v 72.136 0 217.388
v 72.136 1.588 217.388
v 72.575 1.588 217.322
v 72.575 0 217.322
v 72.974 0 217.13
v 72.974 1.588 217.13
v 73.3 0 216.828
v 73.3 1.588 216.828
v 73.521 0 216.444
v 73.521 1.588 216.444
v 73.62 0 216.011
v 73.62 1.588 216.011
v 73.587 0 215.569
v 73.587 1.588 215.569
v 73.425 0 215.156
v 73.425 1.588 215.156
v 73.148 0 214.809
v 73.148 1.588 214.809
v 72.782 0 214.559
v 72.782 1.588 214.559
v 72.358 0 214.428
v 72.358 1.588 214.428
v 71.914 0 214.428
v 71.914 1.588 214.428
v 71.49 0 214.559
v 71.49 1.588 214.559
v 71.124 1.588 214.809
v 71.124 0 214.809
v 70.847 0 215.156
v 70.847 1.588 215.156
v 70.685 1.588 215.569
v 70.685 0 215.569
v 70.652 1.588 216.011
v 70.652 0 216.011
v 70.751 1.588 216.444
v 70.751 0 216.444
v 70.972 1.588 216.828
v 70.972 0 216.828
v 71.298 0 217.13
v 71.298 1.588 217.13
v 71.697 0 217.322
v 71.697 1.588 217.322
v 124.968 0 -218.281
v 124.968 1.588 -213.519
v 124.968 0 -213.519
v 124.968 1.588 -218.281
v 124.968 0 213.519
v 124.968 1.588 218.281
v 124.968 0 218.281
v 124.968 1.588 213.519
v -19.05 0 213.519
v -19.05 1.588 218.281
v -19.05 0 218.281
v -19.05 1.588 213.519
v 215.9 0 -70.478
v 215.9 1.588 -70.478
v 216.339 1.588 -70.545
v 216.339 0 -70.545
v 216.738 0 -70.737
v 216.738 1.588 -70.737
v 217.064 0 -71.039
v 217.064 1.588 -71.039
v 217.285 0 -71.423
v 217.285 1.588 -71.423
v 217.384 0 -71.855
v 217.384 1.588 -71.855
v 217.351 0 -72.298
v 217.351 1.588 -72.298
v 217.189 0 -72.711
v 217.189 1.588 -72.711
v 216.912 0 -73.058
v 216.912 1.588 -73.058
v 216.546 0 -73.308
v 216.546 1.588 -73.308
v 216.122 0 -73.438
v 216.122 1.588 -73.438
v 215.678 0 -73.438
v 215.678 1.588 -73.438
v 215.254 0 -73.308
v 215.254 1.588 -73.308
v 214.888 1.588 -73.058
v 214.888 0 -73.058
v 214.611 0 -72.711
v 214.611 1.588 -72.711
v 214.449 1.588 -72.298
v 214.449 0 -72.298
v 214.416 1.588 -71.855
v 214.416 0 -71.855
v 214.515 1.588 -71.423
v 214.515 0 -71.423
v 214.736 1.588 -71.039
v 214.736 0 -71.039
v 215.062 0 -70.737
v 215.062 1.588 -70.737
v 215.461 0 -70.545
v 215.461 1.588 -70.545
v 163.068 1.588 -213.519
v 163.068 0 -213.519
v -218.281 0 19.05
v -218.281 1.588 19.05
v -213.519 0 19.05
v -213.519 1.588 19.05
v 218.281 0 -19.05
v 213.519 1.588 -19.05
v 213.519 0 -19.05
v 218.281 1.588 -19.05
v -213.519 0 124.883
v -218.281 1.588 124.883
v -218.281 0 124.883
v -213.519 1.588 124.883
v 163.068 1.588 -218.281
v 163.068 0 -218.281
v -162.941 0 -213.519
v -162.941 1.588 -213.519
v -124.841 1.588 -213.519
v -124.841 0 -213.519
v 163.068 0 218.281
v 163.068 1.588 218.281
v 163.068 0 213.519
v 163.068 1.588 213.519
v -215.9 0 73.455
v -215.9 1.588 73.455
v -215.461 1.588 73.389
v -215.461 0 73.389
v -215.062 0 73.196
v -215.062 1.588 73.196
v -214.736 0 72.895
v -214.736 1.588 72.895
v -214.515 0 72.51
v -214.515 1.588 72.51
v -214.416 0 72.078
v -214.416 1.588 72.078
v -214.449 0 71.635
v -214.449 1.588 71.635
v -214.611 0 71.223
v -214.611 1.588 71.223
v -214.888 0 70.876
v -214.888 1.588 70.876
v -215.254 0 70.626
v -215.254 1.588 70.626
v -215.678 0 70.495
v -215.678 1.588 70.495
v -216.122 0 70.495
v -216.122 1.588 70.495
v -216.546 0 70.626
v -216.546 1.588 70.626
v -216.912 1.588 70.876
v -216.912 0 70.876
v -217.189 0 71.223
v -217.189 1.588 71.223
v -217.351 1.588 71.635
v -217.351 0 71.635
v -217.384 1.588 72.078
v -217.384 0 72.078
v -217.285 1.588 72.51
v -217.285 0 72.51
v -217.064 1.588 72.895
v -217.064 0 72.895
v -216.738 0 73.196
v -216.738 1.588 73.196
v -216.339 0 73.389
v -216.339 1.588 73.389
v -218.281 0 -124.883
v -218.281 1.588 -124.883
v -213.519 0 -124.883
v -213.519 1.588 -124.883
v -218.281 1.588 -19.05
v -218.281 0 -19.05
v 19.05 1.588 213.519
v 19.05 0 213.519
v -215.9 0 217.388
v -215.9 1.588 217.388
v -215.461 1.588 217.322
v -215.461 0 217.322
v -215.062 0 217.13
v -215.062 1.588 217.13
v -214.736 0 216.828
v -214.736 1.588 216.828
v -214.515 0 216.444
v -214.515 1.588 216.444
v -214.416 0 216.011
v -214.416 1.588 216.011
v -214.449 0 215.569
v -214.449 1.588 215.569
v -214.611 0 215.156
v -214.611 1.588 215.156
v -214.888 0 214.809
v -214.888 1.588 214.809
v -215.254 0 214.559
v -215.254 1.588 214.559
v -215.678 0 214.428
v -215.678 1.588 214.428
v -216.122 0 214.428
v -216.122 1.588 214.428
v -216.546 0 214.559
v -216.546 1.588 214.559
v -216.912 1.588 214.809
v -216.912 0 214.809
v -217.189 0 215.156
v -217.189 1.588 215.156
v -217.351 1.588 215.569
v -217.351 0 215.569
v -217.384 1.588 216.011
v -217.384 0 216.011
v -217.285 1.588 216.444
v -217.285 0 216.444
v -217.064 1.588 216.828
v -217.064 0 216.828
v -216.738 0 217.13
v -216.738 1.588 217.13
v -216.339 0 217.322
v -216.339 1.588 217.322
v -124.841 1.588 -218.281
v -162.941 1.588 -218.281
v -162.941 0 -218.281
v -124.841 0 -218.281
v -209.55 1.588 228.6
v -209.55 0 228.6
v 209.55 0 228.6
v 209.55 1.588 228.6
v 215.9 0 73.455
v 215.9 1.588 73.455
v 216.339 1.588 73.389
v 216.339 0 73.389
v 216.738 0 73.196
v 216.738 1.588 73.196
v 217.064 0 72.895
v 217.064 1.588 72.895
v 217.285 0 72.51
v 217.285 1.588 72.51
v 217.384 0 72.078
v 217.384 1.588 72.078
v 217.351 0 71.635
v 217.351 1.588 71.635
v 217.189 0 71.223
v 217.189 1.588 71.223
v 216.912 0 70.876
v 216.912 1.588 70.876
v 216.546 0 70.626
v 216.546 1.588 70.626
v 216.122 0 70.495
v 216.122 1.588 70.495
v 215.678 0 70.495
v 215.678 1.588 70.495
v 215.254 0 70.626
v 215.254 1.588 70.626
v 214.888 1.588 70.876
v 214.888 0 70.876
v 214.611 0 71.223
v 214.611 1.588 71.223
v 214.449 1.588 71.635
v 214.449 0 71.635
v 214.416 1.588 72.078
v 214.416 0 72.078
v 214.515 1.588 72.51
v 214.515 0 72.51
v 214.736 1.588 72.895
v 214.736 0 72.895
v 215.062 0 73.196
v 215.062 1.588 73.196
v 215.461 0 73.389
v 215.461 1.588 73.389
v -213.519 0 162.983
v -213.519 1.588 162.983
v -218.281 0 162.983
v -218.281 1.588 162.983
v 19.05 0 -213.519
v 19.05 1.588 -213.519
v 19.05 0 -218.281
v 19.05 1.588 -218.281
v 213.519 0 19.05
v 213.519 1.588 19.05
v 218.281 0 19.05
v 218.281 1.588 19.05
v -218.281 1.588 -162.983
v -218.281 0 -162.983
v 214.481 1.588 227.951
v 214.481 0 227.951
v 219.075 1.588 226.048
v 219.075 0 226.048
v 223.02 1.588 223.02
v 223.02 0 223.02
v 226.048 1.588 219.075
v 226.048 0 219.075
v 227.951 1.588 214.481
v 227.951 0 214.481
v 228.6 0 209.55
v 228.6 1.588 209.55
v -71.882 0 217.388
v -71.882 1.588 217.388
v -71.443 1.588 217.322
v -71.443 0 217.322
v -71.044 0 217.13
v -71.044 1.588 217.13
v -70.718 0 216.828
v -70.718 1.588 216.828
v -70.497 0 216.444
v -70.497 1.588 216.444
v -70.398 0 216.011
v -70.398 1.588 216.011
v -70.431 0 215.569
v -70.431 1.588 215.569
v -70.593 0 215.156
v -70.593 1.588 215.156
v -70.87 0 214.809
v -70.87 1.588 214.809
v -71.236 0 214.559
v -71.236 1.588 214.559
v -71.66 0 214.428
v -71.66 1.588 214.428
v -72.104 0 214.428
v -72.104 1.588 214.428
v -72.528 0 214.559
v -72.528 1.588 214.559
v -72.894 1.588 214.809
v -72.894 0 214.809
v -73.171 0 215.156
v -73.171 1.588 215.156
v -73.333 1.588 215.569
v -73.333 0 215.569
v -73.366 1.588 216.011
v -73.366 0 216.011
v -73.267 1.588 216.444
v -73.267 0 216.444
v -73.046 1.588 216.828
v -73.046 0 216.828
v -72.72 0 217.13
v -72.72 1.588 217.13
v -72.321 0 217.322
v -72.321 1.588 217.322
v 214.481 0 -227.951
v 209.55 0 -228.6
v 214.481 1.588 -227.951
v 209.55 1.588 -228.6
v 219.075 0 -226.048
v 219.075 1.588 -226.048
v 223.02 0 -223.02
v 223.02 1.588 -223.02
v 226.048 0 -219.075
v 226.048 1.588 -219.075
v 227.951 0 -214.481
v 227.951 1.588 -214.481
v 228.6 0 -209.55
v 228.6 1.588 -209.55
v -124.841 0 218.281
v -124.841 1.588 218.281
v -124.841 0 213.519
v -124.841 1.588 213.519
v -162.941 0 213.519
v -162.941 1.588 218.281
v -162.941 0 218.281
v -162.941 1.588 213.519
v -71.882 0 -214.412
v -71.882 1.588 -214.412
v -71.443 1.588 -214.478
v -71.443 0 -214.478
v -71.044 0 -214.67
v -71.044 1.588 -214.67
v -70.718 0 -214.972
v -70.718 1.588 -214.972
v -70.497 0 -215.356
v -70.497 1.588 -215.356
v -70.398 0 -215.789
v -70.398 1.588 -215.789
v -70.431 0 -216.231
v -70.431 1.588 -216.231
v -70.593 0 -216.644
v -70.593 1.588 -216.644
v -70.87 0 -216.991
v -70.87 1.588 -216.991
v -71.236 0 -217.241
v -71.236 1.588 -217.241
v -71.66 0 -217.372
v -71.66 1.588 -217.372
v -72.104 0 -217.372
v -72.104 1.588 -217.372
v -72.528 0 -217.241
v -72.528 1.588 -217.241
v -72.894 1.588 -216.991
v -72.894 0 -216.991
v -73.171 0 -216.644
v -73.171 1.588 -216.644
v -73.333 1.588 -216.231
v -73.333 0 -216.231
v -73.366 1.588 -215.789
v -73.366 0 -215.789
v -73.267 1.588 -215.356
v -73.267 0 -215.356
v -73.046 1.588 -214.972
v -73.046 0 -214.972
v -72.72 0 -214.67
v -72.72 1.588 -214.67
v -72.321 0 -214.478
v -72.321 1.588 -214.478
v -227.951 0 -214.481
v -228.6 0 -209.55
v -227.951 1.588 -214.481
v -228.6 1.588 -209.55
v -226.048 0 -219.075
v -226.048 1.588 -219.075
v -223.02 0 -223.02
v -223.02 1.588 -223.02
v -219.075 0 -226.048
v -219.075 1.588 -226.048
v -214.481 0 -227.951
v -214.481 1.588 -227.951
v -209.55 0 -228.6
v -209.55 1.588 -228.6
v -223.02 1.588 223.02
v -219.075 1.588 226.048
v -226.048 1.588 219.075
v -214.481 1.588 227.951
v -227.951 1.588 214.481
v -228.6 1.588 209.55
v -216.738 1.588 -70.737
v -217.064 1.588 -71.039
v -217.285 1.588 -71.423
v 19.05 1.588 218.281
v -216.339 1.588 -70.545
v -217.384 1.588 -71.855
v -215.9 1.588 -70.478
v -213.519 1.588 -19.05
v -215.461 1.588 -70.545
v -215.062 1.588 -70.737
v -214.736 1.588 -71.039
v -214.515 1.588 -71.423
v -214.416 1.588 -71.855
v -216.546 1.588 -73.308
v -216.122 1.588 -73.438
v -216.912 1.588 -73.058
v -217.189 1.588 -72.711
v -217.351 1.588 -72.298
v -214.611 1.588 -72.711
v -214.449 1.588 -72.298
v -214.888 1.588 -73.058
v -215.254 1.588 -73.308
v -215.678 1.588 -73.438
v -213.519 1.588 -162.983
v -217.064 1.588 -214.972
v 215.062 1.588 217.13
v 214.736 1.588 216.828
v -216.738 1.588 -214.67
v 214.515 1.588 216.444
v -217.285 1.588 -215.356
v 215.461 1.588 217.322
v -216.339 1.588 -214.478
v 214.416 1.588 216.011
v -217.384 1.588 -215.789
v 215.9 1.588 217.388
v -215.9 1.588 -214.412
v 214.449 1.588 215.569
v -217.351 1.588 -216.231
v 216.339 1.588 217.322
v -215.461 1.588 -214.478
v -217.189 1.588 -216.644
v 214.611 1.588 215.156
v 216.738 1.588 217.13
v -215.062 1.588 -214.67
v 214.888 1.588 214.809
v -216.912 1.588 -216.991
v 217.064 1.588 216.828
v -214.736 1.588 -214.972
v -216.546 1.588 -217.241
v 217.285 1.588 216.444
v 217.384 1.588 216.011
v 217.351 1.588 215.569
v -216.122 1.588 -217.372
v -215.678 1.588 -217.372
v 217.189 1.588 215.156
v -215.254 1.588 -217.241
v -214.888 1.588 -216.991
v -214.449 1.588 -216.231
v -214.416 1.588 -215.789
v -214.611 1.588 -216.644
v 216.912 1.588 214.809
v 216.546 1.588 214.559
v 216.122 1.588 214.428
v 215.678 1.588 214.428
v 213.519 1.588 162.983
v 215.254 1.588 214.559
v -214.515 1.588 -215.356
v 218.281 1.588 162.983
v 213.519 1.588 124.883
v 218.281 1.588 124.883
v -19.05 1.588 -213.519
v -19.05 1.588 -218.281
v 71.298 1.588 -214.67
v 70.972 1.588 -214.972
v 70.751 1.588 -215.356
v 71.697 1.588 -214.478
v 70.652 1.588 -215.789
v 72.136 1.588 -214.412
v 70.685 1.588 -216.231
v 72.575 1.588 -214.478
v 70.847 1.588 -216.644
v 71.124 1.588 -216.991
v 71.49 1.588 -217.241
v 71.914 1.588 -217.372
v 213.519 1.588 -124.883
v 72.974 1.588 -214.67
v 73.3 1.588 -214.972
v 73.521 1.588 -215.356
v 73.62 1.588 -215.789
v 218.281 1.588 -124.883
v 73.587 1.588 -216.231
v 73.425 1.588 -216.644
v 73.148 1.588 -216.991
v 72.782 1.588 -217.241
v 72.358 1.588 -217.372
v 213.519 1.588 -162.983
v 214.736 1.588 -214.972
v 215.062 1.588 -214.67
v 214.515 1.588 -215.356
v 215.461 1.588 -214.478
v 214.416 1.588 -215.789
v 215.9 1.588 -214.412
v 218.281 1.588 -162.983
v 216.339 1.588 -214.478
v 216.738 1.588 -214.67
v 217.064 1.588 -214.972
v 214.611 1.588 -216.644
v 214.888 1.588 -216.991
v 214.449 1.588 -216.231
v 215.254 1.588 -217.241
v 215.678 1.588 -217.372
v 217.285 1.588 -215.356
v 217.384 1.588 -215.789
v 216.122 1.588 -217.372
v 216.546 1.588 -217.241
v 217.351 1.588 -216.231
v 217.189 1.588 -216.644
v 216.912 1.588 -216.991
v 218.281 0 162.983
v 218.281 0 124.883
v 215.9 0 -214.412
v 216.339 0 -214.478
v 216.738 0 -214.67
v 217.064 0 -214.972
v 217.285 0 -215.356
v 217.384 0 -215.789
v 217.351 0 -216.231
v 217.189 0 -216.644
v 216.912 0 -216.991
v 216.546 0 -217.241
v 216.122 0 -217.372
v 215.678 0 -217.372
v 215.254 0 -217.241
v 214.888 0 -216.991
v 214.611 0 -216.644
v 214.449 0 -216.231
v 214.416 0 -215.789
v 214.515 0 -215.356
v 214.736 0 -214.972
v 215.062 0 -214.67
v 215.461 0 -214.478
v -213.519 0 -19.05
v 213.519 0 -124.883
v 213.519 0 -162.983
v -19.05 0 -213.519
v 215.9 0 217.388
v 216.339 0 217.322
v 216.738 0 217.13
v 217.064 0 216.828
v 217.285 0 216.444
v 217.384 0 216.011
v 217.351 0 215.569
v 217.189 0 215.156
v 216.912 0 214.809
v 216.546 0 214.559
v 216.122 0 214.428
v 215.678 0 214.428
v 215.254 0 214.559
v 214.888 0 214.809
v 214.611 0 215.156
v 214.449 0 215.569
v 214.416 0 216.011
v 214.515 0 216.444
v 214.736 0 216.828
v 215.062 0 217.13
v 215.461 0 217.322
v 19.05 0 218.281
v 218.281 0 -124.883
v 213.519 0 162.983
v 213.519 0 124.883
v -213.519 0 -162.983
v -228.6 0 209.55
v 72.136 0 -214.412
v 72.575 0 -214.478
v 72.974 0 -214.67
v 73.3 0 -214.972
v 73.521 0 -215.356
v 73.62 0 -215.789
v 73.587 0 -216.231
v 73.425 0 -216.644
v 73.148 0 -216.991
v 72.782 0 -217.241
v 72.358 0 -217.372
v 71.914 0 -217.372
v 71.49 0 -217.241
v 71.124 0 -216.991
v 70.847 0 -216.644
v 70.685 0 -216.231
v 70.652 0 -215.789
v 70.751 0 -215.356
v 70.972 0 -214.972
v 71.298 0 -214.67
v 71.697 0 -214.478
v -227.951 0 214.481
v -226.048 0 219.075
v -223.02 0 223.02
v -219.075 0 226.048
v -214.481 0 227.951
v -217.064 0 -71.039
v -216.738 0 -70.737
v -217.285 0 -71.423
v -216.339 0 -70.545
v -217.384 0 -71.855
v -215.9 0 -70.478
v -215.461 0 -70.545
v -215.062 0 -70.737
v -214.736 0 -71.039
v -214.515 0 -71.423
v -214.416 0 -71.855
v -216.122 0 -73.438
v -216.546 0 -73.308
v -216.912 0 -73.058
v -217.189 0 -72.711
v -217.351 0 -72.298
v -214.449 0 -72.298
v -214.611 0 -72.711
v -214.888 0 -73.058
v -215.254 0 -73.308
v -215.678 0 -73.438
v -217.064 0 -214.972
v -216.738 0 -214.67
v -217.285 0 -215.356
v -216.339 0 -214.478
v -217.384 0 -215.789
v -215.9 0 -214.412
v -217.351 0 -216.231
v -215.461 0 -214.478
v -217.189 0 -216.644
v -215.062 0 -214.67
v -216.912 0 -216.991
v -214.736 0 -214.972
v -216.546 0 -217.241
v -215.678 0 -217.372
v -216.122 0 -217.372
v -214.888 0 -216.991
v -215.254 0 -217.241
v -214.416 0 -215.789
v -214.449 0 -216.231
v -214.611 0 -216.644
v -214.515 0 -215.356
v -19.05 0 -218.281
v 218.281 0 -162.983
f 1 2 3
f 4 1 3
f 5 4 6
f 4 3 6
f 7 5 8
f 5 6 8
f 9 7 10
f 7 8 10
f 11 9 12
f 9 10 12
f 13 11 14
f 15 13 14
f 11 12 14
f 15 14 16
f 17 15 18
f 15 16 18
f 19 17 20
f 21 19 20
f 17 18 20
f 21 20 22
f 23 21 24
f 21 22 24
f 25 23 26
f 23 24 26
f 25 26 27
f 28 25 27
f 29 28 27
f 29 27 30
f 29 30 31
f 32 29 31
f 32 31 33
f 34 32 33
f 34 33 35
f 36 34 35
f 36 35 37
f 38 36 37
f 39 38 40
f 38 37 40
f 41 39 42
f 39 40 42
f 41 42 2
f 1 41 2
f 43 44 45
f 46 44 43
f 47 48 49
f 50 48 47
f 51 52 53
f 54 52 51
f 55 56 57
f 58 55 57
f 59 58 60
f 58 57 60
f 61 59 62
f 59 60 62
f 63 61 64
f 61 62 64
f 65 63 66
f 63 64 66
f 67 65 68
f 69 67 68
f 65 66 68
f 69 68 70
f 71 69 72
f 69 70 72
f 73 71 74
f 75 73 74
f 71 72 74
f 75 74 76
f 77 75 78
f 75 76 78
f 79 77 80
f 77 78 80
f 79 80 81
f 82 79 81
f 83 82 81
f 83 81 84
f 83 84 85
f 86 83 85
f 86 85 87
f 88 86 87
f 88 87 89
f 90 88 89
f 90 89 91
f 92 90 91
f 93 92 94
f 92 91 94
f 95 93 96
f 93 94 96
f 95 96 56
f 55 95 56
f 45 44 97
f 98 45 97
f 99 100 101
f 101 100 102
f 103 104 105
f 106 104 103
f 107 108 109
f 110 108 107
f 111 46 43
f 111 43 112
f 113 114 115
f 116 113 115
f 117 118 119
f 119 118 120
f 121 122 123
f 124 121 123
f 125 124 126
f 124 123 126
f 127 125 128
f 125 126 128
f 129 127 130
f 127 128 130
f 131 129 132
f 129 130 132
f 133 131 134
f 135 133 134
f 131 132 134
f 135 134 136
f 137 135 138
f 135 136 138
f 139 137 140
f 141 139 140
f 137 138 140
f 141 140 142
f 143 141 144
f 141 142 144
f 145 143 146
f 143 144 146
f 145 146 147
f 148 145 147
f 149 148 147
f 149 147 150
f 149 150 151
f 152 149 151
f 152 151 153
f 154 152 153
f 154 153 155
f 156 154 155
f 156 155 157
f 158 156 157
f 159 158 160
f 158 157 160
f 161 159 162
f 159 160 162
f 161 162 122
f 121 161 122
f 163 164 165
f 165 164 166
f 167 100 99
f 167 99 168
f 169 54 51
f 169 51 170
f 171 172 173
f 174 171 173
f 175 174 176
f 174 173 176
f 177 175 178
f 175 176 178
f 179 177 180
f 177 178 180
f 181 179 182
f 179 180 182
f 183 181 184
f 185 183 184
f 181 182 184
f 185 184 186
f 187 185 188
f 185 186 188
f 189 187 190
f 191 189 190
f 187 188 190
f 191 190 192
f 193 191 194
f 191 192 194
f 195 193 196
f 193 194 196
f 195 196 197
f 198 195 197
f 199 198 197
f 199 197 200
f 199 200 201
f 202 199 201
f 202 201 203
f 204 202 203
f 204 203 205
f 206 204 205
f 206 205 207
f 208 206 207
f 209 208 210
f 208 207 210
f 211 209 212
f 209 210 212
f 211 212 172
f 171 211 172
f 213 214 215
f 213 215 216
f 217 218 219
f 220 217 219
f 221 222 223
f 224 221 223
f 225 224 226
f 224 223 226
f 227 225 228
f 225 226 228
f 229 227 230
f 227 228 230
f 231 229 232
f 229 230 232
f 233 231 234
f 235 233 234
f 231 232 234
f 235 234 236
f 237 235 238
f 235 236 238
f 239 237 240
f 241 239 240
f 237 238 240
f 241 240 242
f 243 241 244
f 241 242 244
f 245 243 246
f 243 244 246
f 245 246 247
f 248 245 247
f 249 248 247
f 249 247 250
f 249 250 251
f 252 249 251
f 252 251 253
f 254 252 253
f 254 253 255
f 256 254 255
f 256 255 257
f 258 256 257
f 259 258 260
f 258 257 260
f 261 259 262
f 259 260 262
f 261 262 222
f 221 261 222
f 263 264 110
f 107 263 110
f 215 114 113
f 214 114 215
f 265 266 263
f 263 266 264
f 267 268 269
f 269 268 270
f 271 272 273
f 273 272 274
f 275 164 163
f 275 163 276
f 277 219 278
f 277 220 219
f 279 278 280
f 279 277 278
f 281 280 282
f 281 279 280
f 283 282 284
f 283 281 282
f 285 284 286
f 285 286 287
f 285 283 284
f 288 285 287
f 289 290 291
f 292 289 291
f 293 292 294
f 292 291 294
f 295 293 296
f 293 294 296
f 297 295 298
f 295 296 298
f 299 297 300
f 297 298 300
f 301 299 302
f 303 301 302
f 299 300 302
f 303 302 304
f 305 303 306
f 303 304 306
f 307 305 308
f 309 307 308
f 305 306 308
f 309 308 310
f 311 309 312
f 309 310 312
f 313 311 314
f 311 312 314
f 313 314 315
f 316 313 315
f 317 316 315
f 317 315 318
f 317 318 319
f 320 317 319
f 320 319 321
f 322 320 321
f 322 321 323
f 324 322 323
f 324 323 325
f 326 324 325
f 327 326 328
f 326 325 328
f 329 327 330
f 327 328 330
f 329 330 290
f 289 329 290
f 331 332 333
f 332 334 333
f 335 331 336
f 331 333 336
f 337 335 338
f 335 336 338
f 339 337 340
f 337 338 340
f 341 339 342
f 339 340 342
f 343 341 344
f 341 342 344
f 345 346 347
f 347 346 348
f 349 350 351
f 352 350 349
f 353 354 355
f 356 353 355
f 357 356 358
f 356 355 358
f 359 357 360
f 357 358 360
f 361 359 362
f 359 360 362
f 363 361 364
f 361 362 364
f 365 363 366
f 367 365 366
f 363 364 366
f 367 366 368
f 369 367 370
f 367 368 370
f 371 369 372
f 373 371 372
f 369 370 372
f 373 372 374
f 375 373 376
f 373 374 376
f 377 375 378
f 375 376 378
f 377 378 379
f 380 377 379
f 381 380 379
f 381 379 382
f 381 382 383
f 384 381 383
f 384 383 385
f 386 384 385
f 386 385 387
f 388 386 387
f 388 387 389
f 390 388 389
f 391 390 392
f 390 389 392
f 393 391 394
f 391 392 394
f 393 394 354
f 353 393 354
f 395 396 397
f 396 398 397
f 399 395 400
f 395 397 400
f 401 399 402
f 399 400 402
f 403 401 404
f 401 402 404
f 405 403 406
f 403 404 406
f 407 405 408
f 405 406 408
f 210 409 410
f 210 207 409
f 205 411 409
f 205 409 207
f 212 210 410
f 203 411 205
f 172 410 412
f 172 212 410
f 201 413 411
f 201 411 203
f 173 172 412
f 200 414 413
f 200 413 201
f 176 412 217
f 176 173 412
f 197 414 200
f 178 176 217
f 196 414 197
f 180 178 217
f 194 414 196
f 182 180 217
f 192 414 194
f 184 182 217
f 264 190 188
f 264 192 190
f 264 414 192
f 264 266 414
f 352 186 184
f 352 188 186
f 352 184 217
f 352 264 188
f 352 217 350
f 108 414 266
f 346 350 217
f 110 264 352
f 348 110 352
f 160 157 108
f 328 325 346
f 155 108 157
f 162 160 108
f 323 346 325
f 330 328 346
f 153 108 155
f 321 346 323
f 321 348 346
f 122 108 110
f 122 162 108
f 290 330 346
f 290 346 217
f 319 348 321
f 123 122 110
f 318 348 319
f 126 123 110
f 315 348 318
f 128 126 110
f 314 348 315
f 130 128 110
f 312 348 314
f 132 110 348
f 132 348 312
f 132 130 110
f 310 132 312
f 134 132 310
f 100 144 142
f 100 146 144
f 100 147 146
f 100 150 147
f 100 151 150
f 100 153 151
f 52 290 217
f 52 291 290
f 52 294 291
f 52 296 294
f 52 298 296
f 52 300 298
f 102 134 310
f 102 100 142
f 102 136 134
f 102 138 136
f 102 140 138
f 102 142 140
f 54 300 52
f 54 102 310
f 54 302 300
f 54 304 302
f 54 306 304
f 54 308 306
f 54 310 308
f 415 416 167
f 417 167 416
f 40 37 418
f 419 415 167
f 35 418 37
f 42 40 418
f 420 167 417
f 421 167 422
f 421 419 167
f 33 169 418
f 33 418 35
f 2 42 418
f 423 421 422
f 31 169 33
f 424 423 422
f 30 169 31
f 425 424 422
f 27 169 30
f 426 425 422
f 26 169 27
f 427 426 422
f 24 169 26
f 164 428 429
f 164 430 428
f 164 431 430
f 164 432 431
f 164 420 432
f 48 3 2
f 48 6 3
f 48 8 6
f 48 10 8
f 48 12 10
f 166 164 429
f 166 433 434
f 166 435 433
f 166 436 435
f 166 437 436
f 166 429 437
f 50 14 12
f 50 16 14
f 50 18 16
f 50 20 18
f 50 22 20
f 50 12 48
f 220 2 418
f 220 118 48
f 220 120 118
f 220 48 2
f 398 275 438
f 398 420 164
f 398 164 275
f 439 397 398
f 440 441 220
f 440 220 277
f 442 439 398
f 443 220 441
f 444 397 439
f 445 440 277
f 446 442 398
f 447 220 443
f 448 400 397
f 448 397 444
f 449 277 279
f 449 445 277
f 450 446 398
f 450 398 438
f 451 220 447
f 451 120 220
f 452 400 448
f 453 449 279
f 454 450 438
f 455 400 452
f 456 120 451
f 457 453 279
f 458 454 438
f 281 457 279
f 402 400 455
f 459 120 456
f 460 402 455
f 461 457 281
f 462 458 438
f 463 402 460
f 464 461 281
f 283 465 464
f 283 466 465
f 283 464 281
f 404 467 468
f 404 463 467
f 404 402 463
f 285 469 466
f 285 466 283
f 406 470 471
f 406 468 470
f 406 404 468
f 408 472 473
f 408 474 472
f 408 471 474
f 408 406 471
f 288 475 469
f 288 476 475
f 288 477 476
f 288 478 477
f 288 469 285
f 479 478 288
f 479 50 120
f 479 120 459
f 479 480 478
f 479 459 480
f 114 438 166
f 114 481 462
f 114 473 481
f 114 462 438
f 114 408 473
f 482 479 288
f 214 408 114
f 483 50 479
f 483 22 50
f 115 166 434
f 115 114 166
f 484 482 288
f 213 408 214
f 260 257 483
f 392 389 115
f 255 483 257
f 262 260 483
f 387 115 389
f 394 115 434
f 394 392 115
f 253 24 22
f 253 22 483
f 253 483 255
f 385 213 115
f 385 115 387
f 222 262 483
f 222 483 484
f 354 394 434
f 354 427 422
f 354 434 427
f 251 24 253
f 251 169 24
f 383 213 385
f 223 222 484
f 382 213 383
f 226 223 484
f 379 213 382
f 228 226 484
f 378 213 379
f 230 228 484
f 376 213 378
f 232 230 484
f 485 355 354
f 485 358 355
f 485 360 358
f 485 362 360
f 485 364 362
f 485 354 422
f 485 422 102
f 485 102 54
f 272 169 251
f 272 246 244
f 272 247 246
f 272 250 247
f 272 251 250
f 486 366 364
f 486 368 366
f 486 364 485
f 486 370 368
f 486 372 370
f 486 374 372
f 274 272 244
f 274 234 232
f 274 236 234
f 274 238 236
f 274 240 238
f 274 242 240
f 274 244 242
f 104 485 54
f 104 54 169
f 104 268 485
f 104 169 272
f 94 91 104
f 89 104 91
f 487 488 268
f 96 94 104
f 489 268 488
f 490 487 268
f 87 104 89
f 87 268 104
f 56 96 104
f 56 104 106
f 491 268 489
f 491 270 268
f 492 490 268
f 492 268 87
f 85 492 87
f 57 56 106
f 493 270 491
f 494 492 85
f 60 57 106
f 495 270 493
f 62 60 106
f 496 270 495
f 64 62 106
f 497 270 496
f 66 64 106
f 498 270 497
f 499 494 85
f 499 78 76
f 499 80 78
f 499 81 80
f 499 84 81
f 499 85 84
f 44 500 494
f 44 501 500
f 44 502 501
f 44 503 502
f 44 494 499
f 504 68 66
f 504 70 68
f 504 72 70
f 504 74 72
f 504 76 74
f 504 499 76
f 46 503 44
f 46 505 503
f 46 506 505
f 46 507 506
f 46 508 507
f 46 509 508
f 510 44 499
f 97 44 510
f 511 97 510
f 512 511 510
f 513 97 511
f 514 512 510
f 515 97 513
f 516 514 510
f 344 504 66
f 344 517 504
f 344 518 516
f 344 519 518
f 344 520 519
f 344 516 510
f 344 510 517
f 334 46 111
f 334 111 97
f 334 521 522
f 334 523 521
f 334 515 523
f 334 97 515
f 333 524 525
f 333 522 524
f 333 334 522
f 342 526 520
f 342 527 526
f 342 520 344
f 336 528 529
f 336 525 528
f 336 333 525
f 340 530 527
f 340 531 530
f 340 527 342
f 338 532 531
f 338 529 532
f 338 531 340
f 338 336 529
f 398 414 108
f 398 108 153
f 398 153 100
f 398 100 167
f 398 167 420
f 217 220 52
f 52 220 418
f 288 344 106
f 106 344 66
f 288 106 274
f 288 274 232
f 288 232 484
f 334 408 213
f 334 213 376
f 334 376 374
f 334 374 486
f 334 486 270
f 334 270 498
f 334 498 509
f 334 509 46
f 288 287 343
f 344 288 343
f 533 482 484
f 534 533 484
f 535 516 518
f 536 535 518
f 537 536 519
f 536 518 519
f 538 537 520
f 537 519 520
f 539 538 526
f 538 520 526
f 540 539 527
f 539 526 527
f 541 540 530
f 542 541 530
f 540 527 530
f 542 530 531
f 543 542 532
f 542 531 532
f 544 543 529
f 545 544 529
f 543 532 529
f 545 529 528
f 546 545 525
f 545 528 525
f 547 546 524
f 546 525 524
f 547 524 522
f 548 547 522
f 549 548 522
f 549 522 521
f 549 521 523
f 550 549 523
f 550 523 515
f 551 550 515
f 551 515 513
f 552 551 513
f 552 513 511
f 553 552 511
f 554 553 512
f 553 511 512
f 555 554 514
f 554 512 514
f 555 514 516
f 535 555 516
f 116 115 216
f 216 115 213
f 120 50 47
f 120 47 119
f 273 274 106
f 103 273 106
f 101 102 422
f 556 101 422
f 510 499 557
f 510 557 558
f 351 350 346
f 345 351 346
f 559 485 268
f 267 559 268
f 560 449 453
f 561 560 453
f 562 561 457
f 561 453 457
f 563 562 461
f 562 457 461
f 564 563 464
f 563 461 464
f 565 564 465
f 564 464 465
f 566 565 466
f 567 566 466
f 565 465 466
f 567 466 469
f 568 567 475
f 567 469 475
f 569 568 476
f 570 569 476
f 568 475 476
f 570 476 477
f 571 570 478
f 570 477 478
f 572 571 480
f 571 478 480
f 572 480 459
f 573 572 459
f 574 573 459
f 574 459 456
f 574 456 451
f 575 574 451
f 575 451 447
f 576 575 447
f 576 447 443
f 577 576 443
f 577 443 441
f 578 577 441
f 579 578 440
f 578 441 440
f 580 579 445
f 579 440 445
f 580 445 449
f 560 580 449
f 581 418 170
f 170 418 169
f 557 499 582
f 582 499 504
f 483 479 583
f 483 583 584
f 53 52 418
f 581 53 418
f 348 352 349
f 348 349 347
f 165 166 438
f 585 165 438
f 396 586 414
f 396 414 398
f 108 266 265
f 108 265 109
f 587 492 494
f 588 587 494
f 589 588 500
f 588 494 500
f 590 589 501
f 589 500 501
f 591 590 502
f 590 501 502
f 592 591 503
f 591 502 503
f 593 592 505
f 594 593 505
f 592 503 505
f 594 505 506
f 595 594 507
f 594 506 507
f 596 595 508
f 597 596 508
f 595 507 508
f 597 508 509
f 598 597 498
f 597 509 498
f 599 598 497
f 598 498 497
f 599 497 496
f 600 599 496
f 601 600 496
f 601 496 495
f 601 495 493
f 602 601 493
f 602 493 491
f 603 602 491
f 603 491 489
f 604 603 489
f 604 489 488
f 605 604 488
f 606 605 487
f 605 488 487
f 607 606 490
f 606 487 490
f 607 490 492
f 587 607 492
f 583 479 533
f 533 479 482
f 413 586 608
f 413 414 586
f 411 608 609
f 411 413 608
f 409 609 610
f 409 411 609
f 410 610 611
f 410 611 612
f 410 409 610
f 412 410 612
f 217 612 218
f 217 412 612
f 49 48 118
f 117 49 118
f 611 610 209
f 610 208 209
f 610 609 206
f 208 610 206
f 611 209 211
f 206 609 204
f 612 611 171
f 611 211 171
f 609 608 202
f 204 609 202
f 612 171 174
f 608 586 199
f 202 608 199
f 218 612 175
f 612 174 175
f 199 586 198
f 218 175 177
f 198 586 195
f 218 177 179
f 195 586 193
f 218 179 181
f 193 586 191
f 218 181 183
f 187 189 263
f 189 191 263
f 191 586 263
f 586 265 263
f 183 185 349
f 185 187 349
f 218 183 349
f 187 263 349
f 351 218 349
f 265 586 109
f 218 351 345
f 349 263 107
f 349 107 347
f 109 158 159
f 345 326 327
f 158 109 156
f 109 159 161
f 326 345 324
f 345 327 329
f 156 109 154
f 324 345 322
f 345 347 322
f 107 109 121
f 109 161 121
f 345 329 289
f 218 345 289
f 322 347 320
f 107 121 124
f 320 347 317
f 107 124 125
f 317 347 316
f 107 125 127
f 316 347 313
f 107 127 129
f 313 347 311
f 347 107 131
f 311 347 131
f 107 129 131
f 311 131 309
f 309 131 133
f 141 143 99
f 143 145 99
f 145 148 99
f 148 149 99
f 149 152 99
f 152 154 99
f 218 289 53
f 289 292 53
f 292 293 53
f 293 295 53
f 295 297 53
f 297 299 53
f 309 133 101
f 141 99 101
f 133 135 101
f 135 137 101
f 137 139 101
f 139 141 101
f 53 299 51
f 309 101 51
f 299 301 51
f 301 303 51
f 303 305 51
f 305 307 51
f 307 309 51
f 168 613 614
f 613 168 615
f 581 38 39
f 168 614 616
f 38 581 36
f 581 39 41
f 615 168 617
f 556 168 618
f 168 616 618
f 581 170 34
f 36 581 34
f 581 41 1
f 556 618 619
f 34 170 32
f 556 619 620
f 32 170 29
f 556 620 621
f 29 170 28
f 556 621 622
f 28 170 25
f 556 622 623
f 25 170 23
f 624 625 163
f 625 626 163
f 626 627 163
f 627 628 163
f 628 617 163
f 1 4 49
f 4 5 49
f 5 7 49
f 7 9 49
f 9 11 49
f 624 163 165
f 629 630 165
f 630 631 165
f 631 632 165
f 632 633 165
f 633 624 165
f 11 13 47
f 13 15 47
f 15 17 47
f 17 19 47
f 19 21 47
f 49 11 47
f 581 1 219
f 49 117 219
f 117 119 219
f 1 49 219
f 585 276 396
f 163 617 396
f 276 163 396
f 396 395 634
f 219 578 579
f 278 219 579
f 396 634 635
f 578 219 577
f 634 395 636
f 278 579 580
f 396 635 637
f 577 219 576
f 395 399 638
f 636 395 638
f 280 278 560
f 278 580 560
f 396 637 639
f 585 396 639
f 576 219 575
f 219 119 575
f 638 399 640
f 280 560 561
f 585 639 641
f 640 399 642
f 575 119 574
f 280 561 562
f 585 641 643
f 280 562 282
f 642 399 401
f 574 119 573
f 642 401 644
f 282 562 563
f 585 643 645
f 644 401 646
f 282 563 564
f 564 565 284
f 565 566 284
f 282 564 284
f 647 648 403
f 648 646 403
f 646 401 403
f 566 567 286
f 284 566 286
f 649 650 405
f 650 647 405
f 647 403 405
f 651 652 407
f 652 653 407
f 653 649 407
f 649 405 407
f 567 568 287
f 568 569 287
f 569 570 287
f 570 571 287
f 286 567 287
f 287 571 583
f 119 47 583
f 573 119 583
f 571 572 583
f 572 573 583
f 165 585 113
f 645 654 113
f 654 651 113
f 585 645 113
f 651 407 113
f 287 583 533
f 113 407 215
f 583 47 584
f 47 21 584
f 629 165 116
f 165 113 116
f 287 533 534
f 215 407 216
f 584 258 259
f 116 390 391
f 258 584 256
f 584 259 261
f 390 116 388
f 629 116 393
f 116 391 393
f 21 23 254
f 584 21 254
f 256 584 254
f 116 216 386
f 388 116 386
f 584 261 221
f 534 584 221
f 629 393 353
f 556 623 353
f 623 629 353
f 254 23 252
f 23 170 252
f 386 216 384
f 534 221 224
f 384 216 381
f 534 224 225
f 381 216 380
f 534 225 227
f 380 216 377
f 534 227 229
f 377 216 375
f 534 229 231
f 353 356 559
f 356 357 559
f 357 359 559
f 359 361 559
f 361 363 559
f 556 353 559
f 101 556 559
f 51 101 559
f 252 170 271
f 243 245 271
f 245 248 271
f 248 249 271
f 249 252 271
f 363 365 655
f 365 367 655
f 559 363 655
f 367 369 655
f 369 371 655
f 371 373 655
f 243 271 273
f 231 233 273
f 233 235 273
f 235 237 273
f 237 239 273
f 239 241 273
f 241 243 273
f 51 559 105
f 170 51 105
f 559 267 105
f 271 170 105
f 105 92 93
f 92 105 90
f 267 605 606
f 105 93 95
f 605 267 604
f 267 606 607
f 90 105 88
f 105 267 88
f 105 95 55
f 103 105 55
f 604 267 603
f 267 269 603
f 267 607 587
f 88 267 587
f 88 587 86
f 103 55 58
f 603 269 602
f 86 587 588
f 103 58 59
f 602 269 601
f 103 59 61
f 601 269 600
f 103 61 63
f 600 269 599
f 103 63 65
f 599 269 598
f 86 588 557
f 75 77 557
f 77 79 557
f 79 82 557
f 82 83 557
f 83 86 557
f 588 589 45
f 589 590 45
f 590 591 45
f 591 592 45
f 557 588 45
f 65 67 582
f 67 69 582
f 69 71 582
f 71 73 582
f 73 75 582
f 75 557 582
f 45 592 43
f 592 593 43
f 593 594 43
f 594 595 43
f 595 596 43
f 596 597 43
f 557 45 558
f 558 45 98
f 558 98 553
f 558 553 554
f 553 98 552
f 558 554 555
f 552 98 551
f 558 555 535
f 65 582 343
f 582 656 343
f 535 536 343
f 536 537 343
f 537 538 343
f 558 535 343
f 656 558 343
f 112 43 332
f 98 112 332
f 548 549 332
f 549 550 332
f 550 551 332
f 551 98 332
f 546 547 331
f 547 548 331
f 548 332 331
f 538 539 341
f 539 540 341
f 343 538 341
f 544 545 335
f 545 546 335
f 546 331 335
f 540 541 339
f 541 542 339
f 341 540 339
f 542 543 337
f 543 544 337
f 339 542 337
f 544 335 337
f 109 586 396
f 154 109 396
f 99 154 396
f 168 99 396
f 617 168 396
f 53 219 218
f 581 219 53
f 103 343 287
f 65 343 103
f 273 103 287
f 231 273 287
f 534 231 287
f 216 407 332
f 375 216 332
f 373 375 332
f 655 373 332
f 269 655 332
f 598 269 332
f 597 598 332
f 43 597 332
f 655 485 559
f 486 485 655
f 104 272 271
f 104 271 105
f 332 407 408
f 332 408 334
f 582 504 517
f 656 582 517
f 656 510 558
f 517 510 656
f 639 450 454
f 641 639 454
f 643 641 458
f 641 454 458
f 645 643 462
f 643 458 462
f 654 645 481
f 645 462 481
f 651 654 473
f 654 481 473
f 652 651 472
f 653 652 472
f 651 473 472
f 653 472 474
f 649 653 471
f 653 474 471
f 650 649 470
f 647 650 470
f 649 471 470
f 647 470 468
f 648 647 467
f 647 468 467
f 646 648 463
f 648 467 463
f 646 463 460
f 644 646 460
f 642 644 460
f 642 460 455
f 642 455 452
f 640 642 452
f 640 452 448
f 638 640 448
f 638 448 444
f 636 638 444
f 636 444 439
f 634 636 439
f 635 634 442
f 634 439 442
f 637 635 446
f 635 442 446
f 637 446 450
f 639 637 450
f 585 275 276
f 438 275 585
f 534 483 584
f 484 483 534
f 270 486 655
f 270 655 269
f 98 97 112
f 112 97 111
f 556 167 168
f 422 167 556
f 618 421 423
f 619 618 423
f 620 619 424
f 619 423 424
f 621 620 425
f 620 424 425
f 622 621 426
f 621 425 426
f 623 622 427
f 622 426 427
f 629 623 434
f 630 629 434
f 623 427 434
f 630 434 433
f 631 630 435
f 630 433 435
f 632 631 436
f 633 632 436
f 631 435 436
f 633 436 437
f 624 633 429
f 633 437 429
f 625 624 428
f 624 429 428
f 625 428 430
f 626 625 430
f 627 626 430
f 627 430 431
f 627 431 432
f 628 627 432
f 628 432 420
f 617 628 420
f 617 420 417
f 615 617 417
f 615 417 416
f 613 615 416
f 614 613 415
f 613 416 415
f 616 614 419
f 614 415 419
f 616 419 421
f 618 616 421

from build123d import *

# Parameters (mm, degrees)
SKETCH1_W           = 457.2
SKETCH1_H           = 457.2
BOSS_EXTRUDE1_DEPTH = 1.5875
SKETCH2_W           = 4.7625
SKETCH2_H           = 38.1
SKETCH2_W_2         = 38.1
SKETCH2_H_2         = 4.7625
CUT_EXTRUDE2_DEPTH  = 1.5875
SKETCH3_R           = 1.48828125
CUT_EXTRUDE3_DEPTH  = 1.5875
FILLET1_R           = 19.05


with BuildPart() as part:
    # Sketch1 → Boss-Extrude1 (new body)
    with BuildSketch(Plane(origin=(0, 0, 0), x_dir=(1, 0, 0), z_dir=(0, 1, 0))):
        Rectangle(SKETCH1_W, SKETCH1_H)
    extrude(amount=BOSS_EXTRUDE1_DEPTH)

    # Sketch2 → Cut-Extrude2 (cut)
    with BuildSketch(Plane(origin=(0, 1.5875, 0), x_dir=(1, 0, 0), z_dir=(0, 1, 0))):
        with Locations((-215.9, -143.933333333)):
            Rectangle(SKETCH2_W, SKETCH2_H)
        with Locations((-215.9, 0)):
            Rectangle(SKETCH2_W, SKETCH2_H)
        with Locations((-215.9, 143.933333333)):
            Rectangle(SKETCH2_W, SKETCH2_H)
        with Locations((215.9, -143.933333333)):
            Rectangle(SKETCH2_W, SKETCH2_H)
        with Locations((215.9, 0)):
            Rectangle(SKETCH2_W, SKETCH2_H)
        with Locations((215.9, 143.933333333)):
            Rectangle(SKETCH2_W, SKETCH2_H)
        with Locations((144.018, 215.9)):
            Rectangle(SKETCH2_W_2, SKETCH2_H_2)
        with Locations((0, 215.9)):
            Rectangle(SKETCH2_W_2, SKETCH2_H_2)
        with Locations((-143.891, 215.9)):
            Rectangle(SKETCH2_W_2, SKETCH2_H_2)
        with Locations((144.018, -215.9)):
            Rectangle(SKETCH2_W_2, SKETCH2_H_2)
        with Locations((-143.891, -215.9)):
            Rectangle(SKETCH2_W_2, SKETCH2_H_2)
        with Locations((0, -215.9)):
            Rectangle(SKETCH2_W_2, SKETCH2_H_2)
    extrude(amount=-CUT_EXTRUDE2_DEPTH, mode=Mode.SUBTRACT)

    # Sketch3 → Cut-Extrude3 (cut)
    with BuildSketch(Plane(origin=(0, 1.5875, 0), x_dir=(1, 0, 0), z_dir=(0, 1, 0))):
        with Locations(Location((-71.882, 215.9, 0), (0, 0, 270))):
            Circle(SKETCH3_R)
        with Locations(Location((72.136, 215.9, 0), (0, 0, 270))):
            Circle(SKETCH3_R)
        with Locations(Location((215.9, 215.9, 0), (0, 0, 270))):
            Circle(SKETCH3_R)
        with Locations(Location((215.9, 71.966666667, 0), (0, 0, 270))):
            Circle(SKETCH3_R)
        with Locations(Location((215.9, -71.966666667, 0), (0, 0, 270))):
            Circle(SKETCH3_R)
        with Locations(Location((215.9, -215.9, 0), (0, 0, 270))):
            Circle(SKETCH3_R)
        with Locations(Location((72.136, -215.9, 0), (0, 0, 270))):
            Circle(SKETCH3_R)
        with Locations(Location((-71.882, -215.9, 0), (0, 0, 270))):
            Circle(SKETCH3_R)
        with Locations(Location((-215.9, -215.9, 0), (0, 0, 270))):
            Circle(SKETCH3_R)
        with Locations(Location((-215.9, -71.966666667, 0), (0, 0, 270))):
            Circle(SKETCH3_R)
        with Locations(Location((-215.9, 71.966666667, 0), (0, 0, 270))):
            Circle(SKETCH3_R)
        with Locations(Location((-215.9, 215.9, 0), (0, 0, 270))):
            Circle(SKETCH3_R)
    extrude(amount=-CUT_EXTRUDE3_DEPTH, mode=Mode.SUBTRACT)

    # Fillet1
    fillet1_edges = [part.edges().sort_by_distance(p)[0] for p in [
        (-228.6, 0.79375, -228.6),
        (228.6, 0.79375, -228.6),
        (228.6, 0.79375, 228.6),
        (-228.6, 0.79375, 228.6),
    ]]
    fillet(fillet1_edges, radius=FILLET1_R)


solid = part.part
